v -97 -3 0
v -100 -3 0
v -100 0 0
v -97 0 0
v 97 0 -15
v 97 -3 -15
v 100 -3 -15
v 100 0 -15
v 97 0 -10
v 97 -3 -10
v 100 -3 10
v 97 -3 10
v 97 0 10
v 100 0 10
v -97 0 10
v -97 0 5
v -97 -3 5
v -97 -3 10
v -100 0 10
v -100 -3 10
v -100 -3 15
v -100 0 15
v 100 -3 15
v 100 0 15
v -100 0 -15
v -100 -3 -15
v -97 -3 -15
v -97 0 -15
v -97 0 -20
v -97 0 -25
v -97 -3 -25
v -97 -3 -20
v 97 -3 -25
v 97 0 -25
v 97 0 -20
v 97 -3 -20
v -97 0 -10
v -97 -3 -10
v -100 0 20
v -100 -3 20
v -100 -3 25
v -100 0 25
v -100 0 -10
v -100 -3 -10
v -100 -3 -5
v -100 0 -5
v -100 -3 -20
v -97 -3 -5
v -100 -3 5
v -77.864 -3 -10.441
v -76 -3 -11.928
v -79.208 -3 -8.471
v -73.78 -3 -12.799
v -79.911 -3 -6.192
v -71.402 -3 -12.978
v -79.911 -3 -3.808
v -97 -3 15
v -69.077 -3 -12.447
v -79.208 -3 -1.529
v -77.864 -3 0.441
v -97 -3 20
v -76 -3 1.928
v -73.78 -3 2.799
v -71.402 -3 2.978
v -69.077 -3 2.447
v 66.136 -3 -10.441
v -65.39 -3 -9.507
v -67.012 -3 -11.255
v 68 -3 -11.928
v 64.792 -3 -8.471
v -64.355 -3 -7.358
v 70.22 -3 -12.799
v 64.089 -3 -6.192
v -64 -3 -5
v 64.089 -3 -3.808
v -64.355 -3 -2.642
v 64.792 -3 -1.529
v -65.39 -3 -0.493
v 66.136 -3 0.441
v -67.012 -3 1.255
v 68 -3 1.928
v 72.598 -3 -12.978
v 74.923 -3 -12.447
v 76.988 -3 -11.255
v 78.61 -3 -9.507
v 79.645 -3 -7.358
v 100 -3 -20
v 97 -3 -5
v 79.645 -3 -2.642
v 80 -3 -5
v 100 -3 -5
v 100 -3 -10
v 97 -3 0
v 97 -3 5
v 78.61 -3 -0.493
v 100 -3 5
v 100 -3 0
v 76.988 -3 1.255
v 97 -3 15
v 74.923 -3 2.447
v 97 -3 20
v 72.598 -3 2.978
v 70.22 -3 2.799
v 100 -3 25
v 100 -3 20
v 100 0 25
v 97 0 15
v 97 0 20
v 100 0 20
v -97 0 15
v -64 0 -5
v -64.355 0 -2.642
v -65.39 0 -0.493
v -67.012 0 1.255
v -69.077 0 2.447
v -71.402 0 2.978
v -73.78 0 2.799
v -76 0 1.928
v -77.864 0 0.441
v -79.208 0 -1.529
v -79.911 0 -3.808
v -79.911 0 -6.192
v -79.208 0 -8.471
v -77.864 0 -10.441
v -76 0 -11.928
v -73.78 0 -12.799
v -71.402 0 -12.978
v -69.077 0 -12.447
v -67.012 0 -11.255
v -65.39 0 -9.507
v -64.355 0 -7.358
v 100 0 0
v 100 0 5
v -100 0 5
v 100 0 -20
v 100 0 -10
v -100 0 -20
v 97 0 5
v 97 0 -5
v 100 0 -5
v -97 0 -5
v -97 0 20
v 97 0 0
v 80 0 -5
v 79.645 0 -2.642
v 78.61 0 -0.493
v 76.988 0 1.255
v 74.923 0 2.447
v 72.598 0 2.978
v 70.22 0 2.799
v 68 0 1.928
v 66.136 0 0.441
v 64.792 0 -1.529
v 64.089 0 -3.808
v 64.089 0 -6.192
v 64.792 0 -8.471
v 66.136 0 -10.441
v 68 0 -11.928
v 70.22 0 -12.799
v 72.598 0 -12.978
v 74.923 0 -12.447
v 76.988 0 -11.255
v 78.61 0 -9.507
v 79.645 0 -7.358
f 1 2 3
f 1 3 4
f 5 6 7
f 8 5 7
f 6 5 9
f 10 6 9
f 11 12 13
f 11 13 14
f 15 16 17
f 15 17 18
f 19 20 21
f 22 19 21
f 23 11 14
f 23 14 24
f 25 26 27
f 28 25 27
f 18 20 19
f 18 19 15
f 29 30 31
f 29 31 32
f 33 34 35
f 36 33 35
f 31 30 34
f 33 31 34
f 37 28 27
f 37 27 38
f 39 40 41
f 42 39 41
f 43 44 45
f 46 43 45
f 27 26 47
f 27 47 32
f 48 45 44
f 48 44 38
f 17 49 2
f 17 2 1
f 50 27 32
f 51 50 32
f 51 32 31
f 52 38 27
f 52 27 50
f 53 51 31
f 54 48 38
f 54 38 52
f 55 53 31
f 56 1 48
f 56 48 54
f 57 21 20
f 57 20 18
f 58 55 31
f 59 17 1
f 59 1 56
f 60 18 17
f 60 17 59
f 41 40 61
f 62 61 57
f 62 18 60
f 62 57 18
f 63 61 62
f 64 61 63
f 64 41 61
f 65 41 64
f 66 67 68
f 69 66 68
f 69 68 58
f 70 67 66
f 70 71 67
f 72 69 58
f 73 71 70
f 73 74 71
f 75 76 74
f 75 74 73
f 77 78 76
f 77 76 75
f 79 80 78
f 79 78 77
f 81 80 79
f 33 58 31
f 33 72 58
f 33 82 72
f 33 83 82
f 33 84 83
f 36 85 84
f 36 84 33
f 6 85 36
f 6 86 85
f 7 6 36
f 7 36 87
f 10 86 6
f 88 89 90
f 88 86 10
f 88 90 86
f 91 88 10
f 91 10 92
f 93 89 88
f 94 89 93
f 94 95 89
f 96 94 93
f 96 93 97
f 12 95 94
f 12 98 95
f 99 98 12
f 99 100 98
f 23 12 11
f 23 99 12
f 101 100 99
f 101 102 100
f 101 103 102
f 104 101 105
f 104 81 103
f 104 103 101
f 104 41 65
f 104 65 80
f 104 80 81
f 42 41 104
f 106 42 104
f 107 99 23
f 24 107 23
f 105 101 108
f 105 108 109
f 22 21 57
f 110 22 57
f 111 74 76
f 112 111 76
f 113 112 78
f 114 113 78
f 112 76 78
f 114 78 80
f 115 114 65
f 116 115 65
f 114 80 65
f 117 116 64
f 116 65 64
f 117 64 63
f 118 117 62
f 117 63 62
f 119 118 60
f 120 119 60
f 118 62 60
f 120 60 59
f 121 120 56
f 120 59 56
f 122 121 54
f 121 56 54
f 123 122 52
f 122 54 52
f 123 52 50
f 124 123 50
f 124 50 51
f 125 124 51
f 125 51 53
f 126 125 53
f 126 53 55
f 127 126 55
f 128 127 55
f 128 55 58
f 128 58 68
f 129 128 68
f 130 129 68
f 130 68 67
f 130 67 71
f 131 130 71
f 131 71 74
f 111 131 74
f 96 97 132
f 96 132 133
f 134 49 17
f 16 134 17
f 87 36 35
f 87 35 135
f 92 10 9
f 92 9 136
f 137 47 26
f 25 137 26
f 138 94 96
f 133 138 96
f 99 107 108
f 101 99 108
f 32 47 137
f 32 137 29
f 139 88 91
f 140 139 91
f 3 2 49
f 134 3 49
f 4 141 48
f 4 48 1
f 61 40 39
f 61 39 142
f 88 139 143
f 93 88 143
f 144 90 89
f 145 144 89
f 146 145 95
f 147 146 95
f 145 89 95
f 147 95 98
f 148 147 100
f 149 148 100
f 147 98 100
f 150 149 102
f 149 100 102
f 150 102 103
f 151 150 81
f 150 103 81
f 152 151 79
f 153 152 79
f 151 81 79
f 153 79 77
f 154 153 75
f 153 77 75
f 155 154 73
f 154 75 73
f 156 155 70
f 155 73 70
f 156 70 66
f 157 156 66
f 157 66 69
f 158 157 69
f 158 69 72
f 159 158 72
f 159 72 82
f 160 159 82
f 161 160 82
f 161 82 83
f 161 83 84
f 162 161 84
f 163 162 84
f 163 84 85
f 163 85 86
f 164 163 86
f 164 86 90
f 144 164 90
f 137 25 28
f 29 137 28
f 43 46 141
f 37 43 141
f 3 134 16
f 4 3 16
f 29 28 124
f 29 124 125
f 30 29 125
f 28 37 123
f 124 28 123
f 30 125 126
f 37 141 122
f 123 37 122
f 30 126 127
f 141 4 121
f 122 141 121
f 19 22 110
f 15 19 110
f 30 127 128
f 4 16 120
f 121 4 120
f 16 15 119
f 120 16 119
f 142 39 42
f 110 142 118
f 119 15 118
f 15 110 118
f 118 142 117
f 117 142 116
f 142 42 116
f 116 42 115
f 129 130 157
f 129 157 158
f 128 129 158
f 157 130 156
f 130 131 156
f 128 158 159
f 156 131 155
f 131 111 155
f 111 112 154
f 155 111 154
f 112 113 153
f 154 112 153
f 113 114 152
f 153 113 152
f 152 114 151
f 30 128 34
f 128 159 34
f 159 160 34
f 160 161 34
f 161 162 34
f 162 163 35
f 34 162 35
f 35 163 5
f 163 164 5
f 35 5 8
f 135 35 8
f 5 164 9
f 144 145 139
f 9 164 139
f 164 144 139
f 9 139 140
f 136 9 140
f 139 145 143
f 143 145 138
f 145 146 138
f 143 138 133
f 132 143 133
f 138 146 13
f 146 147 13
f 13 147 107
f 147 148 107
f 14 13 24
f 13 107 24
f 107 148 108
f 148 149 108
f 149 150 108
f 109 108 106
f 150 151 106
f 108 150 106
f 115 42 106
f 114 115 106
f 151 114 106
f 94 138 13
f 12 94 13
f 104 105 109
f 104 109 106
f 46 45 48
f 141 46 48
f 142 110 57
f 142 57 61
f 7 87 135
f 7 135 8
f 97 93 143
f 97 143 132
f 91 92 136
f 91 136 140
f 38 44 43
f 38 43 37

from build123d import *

# Parameters (mm, degrees)
F0_W     = 194
F0_H     = 50
F1_DEPTH = 3
F2_W     = 3
F2_H     = 5
F3_DEPTH = 3
F4_R     = 8
F5_DEPTH = 25


with BuildPart() as f1:
    # F0 (on Front) → F1 (new body)
    with BuildSketch(Plane.XZ):
        Rectangle(F0_W, F0_H)
    extrude(amount=F1_DEPTH)

    # F2 (on face) → F3 (join)
    with BuildSketch(Plane.XZ.offset(3)):
        with Locations((-98.5, 22.5)):
            Rectangle(F2_W, F2_H)
        with Locations((-98.5, 12.5)):
            Rectangle(F2_W, F2_H)
        with Locations((-98.5, 2.5)):
            Rectangle(F2_W, F2_H)
        with Locations((-98.5, -7.5)):
            Rectangle(F2_W, F2_H)
        with Locations((-98.5, -17.5)):
            Rectangle(F2_W, F2_H)
        with Locations((98.5, 12.5)):
            Rectangle(F2_W, F2_H)
        with Locations((98.5, 22.5)):
            Rectangle(F2_W, F2_H)
        with Locations((98.5, 2.5)):
            Rectangle(F2_W, F2_H)
        with Locations((98.5, -7.5)):
            Rectangle(F2_W, F2_H)
        with Locations((98.5, -17.5)):
            Rectangle(F2_W, F2_H)
    extrude(amount=-F3_DEPTH)

    # F4 (on face) → F5 (cut)
    with BuildSketch(Plane.XZ.offset(3)):
        with Locations((-72, -5)):
            Circle(F4_R)
        with Locations((72, -5)):
            Circle(F4_R)
    extrude(amount=-F5_DEPTH, mode=Mode.SUBTRACT)


solid = f1.part
